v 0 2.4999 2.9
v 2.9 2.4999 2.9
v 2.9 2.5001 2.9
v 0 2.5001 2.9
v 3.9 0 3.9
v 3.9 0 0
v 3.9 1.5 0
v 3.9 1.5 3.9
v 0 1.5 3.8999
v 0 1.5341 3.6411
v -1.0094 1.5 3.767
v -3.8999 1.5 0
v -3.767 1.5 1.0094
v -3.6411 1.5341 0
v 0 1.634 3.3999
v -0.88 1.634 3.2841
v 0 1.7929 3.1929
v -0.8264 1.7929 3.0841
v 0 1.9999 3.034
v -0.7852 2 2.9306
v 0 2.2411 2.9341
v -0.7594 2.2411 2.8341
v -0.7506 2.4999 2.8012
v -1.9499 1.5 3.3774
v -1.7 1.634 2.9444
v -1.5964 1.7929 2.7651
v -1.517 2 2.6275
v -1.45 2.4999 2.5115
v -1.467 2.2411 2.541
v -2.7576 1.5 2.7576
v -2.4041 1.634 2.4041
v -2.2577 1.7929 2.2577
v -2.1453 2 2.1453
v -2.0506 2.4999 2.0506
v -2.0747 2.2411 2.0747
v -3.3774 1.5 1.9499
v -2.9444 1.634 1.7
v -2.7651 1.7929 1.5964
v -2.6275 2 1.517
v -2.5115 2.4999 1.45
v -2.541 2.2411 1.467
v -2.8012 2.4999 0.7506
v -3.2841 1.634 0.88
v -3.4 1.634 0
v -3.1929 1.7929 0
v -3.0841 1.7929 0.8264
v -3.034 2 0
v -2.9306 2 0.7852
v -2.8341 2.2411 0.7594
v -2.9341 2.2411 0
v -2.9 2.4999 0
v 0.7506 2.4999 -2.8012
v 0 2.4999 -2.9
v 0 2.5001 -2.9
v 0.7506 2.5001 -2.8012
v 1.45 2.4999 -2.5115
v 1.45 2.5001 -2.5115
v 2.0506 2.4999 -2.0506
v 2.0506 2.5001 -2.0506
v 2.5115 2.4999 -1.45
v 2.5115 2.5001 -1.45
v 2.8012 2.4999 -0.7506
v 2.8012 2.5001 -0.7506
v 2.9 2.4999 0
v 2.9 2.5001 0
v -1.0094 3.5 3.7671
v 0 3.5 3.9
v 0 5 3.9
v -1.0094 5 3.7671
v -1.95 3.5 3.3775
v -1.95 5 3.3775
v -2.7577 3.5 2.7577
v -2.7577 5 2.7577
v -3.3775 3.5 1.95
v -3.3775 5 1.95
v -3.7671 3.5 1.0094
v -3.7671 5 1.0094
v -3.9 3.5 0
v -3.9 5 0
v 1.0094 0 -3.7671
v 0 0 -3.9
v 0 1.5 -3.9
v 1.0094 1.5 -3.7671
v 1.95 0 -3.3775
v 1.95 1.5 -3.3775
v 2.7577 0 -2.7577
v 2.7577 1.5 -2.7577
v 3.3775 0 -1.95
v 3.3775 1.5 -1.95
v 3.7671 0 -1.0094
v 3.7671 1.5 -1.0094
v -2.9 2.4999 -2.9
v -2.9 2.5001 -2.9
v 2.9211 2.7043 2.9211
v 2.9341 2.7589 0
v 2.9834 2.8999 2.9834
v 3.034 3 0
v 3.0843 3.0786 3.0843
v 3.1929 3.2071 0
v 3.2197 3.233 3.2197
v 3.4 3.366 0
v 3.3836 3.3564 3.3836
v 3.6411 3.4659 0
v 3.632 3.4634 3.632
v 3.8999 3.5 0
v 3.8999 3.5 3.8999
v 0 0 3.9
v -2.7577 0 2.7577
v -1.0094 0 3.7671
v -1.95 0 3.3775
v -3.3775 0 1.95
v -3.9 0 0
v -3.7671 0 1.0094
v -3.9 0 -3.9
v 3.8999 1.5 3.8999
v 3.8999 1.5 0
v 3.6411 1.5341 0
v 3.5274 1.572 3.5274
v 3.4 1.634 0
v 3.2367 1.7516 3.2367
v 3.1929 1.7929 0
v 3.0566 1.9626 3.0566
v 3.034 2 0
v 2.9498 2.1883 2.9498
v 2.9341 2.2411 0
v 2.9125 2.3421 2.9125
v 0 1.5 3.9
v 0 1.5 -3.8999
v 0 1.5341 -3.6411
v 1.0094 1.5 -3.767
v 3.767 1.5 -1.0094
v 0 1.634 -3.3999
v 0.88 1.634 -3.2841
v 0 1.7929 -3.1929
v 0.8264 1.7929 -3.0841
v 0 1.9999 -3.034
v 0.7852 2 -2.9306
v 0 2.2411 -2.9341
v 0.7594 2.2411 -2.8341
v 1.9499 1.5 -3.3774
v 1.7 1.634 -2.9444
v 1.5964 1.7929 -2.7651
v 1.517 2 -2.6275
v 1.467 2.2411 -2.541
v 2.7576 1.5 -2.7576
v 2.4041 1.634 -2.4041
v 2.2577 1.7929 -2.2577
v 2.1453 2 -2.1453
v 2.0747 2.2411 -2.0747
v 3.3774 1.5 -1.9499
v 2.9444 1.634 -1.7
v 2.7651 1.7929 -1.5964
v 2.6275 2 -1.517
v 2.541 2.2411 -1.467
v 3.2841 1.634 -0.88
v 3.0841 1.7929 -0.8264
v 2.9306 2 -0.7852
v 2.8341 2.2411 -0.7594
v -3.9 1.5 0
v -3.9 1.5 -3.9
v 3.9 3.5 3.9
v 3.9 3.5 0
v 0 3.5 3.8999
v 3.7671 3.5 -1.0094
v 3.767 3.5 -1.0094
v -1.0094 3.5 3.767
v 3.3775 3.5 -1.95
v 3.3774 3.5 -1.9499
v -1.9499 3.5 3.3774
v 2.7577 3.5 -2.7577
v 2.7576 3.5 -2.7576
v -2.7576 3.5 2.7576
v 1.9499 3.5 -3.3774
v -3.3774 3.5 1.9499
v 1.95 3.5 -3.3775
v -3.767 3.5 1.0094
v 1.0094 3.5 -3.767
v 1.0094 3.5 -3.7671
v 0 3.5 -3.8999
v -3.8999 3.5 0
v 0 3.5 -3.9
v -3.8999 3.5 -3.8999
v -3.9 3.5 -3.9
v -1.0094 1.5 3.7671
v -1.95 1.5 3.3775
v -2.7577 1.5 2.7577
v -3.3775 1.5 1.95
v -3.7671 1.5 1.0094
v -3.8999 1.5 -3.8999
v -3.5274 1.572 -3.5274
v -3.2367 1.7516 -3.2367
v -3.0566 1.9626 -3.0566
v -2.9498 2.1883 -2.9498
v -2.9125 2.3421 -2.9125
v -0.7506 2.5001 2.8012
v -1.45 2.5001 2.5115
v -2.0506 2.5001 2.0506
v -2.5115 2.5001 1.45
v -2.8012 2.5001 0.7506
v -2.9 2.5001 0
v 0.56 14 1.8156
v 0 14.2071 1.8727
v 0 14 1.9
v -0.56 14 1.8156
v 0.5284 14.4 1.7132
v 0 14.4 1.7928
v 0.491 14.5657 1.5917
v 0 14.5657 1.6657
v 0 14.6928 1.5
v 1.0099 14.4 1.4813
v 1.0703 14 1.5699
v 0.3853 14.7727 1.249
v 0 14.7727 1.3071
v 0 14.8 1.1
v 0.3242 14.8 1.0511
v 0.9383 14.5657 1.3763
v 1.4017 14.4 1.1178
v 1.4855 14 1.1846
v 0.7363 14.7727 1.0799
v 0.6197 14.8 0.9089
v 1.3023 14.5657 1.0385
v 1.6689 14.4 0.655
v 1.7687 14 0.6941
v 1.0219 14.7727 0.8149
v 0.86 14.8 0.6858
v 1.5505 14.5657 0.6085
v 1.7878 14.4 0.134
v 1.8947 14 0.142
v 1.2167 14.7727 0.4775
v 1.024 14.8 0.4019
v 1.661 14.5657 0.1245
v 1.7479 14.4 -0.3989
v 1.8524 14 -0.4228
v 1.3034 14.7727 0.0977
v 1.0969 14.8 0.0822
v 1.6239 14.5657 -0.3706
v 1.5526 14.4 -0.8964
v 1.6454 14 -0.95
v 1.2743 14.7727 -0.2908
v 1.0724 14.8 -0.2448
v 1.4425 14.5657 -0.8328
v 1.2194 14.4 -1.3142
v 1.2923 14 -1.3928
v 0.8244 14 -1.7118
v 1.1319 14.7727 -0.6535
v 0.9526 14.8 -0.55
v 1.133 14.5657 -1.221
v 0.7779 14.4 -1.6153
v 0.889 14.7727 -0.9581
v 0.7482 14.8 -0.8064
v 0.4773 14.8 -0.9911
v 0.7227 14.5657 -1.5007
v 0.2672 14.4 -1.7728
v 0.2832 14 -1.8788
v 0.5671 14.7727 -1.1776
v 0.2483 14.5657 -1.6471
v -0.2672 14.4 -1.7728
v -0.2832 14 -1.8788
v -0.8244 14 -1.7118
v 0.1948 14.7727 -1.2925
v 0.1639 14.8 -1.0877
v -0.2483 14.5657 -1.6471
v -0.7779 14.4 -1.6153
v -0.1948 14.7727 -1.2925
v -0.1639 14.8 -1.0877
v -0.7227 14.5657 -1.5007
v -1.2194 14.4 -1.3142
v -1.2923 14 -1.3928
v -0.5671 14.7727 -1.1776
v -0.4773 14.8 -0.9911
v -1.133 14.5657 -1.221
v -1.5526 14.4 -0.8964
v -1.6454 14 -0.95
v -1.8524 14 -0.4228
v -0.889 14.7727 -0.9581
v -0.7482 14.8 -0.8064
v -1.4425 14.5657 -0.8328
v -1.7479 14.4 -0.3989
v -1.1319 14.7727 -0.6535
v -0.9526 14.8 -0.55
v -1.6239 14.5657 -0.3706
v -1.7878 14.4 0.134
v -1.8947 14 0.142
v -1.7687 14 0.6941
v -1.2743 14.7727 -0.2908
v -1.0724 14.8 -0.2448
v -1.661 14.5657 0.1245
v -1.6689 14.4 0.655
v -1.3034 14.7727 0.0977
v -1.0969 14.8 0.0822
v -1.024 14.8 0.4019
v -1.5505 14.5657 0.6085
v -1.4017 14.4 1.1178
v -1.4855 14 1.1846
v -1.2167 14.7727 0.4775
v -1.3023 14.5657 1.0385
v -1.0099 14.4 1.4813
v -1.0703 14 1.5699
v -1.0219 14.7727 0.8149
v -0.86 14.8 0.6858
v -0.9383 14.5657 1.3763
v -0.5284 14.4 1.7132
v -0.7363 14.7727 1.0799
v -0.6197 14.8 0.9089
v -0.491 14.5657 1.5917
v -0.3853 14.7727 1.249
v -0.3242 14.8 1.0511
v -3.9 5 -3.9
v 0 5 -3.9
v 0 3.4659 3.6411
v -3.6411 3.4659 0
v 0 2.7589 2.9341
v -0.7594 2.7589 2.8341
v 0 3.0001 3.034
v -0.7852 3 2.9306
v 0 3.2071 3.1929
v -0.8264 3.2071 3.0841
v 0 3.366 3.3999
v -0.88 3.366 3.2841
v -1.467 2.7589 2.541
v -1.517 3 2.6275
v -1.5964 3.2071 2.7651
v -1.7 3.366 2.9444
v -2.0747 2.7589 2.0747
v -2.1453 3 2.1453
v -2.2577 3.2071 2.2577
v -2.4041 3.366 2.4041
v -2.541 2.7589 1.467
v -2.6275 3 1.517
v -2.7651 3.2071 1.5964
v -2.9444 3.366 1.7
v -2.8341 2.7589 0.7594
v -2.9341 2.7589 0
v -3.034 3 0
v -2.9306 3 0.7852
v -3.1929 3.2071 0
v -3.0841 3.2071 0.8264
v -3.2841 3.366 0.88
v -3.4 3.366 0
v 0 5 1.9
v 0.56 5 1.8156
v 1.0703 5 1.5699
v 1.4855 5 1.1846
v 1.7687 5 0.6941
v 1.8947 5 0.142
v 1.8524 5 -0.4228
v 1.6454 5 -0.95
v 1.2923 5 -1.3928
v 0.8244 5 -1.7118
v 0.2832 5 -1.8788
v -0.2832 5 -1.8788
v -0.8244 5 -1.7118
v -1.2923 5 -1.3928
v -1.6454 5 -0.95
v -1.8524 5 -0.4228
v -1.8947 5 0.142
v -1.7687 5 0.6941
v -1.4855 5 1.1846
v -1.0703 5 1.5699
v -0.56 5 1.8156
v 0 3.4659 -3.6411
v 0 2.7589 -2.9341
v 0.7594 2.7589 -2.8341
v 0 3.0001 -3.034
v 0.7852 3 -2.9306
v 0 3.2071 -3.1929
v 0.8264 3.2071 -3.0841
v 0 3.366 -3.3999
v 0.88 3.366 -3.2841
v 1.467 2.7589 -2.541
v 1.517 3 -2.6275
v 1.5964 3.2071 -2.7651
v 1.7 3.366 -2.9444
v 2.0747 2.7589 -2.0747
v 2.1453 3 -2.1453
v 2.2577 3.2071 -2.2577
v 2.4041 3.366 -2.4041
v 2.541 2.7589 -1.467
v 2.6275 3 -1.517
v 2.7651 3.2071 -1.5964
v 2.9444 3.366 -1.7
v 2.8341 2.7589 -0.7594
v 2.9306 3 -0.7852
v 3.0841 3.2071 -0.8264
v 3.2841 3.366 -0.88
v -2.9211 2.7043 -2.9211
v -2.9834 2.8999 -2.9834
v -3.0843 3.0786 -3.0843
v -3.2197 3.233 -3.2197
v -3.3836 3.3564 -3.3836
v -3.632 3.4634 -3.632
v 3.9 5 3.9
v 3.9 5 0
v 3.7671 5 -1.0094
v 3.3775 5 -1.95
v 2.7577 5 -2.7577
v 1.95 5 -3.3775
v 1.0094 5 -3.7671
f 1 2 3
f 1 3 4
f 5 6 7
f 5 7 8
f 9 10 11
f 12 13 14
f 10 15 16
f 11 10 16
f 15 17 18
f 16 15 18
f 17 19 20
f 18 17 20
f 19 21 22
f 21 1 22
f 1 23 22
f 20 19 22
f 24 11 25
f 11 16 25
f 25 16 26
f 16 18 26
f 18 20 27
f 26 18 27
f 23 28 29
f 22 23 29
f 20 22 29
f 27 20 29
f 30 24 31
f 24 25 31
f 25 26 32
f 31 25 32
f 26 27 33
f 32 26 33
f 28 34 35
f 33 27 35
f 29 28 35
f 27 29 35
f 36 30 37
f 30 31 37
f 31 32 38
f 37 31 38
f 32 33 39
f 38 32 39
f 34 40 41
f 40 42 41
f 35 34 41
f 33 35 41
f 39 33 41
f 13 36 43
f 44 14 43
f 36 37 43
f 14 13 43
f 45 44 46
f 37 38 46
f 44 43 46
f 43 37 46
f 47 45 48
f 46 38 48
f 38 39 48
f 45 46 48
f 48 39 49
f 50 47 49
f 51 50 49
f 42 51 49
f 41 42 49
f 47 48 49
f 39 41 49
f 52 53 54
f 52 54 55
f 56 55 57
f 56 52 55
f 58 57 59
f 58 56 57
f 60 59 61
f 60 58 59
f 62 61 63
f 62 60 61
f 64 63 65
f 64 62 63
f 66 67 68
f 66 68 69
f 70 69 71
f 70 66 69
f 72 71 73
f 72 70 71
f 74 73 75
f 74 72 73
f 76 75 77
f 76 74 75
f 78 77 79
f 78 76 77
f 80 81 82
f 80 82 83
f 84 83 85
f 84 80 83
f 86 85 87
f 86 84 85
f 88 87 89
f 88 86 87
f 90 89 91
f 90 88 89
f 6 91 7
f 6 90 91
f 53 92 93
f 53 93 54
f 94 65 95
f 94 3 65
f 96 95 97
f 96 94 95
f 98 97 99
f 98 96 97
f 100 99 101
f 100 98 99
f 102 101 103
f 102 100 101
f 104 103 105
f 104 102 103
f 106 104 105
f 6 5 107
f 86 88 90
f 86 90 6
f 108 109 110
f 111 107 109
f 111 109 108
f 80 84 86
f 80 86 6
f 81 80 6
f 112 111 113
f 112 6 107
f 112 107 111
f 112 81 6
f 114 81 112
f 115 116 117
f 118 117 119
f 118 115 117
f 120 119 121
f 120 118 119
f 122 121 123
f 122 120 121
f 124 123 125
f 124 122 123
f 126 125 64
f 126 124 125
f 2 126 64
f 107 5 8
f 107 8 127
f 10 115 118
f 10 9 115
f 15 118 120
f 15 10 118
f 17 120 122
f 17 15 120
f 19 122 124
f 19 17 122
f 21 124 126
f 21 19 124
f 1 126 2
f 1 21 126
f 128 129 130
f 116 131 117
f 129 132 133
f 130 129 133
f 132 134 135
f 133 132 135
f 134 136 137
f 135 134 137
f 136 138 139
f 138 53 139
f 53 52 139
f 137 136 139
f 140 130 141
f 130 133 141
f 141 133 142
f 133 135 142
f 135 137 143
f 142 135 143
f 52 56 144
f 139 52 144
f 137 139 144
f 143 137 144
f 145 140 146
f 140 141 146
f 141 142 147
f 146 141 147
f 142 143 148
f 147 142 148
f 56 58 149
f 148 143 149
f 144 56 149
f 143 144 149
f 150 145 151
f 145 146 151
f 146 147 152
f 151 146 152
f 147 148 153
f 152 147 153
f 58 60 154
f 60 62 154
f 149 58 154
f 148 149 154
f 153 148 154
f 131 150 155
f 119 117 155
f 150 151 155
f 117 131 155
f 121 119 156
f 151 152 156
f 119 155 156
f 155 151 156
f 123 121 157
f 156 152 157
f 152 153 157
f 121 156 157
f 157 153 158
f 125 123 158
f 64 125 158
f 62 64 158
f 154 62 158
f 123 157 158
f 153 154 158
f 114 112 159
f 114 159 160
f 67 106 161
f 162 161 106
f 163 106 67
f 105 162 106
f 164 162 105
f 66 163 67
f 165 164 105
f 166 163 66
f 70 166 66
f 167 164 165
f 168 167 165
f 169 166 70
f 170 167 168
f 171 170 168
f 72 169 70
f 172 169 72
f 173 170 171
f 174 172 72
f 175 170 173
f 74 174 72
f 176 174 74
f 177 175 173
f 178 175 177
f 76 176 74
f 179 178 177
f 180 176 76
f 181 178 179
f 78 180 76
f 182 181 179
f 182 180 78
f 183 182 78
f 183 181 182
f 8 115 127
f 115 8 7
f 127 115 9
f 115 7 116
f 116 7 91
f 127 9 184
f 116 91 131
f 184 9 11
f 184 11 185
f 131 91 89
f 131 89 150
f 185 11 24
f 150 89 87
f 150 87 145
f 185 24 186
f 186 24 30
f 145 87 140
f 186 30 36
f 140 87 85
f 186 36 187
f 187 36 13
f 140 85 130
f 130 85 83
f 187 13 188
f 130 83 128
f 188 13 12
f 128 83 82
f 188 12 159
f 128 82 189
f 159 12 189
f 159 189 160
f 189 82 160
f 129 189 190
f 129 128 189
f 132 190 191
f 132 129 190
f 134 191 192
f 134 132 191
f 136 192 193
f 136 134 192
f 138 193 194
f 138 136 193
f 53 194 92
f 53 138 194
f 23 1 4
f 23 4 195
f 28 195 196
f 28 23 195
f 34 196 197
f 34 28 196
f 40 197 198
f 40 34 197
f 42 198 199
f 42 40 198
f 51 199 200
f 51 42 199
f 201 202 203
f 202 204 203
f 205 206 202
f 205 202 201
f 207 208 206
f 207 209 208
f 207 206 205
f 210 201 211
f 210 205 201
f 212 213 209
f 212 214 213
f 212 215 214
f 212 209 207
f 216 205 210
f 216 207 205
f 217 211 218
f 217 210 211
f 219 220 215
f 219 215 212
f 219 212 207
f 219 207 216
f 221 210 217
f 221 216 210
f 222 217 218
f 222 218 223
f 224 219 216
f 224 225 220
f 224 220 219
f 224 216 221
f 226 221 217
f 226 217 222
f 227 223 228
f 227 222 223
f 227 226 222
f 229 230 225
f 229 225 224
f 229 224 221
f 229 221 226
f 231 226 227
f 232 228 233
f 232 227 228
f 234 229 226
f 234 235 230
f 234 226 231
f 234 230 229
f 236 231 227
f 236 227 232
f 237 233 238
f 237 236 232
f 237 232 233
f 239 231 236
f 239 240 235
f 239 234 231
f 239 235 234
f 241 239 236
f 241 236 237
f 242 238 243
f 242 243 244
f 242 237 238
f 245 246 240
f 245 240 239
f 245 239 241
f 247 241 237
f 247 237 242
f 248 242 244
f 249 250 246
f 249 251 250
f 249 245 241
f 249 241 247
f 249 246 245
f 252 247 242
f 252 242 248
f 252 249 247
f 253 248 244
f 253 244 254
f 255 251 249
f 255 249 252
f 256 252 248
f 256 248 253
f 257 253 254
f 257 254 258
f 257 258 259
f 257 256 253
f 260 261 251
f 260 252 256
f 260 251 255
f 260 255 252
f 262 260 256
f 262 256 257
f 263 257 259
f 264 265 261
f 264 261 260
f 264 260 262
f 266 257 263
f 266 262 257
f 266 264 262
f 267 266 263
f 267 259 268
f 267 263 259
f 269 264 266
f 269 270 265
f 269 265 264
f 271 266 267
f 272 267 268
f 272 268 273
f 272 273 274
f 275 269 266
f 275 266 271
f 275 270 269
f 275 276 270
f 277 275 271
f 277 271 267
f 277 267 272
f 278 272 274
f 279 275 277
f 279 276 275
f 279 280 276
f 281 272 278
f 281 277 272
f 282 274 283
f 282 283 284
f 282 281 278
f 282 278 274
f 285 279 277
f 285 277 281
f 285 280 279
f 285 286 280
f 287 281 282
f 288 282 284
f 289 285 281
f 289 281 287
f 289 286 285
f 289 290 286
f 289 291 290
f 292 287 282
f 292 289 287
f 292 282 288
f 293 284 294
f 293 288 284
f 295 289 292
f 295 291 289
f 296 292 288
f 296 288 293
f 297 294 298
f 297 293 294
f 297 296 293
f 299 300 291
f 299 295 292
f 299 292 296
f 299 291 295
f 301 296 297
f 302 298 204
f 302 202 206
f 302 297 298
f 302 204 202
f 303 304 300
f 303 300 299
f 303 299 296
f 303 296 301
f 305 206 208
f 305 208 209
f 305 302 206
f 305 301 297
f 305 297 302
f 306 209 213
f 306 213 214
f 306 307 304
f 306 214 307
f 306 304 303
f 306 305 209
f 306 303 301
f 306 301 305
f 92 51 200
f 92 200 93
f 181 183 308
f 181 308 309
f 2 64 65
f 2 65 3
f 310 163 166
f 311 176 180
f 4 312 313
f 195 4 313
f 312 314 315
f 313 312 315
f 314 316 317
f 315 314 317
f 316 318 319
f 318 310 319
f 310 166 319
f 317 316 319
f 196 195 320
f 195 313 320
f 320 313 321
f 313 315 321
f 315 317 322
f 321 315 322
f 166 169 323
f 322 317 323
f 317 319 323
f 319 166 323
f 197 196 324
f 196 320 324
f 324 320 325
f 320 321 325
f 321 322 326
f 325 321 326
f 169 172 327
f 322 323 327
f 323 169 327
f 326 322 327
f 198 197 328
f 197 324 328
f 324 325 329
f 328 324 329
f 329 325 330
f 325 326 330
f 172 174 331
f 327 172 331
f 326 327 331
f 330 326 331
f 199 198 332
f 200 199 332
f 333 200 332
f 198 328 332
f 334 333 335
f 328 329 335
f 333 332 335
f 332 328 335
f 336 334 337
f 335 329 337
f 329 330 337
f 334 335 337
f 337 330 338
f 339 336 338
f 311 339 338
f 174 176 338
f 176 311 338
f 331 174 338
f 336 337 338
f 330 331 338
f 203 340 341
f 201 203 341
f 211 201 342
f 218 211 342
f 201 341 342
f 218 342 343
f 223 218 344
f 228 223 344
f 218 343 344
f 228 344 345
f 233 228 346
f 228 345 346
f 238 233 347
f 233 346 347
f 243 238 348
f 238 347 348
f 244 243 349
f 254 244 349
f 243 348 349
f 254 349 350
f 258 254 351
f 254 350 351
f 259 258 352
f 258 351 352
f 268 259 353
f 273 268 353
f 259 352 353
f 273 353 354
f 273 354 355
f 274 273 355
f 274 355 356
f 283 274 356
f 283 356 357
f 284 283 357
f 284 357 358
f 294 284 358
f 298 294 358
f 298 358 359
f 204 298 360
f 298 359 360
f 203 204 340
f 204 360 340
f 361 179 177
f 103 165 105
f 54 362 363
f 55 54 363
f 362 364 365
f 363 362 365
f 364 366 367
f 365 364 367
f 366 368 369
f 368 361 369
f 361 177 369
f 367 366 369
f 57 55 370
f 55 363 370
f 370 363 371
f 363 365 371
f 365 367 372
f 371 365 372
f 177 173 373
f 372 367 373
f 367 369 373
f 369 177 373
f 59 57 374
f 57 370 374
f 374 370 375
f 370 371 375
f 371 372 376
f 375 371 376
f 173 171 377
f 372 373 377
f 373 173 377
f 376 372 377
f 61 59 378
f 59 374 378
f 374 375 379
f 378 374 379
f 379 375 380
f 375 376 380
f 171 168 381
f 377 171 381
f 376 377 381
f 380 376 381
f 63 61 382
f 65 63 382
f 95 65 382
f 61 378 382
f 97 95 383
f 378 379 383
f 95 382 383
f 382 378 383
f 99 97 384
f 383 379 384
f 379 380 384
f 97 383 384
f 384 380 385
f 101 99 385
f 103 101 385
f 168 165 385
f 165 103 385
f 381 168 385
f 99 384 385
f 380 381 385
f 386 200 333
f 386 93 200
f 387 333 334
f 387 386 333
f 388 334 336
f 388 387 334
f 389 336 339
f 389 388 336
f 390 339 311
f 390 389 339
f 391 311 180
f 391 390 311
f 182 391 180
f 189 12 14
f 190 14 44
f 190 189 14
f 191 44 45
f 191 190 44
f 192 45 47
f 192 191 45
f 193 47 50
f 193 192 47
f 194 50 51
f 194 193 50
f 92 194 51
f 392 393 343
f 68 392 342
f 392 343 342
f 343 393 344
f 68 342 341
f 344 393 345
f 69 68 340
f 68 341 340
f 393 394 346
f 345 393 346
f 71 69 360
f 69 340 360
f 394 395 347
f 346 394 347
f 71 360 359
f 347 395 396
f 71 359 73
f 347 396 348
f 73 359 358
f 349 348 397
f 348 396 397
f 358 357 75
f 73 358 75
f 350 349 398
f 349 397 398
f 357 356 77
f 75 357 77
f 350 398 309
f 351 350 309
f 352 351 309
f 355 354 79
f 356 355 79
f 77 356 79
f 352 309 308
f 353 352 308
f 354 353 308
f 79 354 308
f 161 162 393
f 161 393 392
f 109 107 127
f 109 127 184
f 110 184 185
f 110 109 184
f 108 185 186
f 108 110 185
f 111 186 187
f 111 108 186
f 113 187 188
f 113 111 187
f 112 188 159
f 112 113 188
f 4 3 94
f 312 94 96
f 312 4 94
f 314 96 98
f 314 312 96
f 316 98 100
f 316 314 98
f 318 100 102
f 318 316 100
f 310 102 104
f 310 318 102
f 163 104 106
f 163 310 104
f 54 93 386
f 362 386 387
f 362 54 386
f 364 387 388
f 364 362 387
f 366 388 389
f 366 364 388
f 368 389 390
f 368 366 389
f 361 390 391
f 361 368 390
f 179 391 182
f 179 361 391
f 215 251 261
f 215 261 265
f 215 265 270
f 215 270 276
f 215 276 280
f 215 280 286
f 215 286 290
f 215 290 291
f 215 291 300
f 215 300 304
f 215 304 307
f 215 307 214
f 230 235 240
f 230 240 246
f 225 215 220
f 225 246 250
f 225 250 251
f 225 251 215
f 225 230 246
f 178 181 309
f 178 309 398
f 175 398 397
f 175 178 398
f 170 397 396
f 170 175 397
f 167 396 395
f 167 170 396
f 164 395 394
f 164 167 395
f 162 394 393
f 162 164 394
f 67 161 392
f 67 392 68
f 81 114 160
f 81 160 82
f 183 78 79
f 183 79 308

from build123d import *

# Parameters (mm, degrees)
BOSS_EXTRUDE1_DEPTH     = 5
SKETCH2_R               = 1.9
BOSS_EXTRUDE2_DEPTH     = 9.8
CUT_EXTRUDE2_DEPTH      = 1
CUT_EXTRUDE2_DEPTH_BACK = 1
FILLET1_R               = 1
FILLET2_R               = 0.8


with BuildPart() as part:
    # Sketch1 → Boss-Extrude1 (new body)
    with BuildSketch(Plane(origin=(0, 0, 0), x_dir=(1, 0, 0), z_dir=(0, 1, 0))):
        with BuildLine():
            Line((-3.9, 3.9), (0, 3.9))
            ThreePointArc((0, 3.9), (2.757716447, 2.757716447), (3.9, 0))
            Line((3.9, 0), (3.9, -3.9))
            Line((3.9, -3.9), (0, -3.9))
            ThreePointArc((0, -3.9), (-2.757716447, -2.757716447), (-3.9, 0))
            Line((-3.9, 0), (-3.9, 3.9))
        make_face()
    extrude(amount=BOSS_EXTRUDE1_DEPTH)

    # Sketch2 → Boss-Extrude2 (add)
    with BuildSketch(Plane(origin=(0, 5, 0), x_dir=(1, 0, 0), z_dir=(0, 1, 0))):
        with Locations(Location((0, 0, 0), (0, 0, 270))):
            Circle(SKETCH2_R)
    extrude(amount=BOSS_EXTRUDE2_DEPTH)

    # Sketch3 → Cut-Extrude2 (cut, two sides: drawn at the far end of the back side and taken through both)
    with BuildSketch(Plane(origin=(0, 2.5, 0), x_dir=(1, 0, 0), z_dir=(0, 1, 0)).offset(-CUT_EXTRUDE2_DEPTH_BACK)):
        with BuildLine():
            Line((-3.9, 0), (-3.9, 3.9))
            Line((-3.9, 3.9), (0, 3.9))
            ThreePointArc((0, 3.9), (2.757716447, 2.757716447), (3.9, 0))
            Line((3.9, 0), (3.9, -3.9))
            Line((3.9, -3.9), (0, -3.9))
            ThreePointArc((0, -3.9), (-2.757716447, -2.757716447), (-3.9, 0))
        make_face()
        with BuildLine():
            Line((-2.9, 0), (-2.9, 2.9))
            Line((-2.9, 2.9), (0, 2.9))
            ThreePointArc((0, 2.9), (2.050609665, 2.050609665), (2.9, 0))
            Line((2.9, 0), (2.9, -2.9))
            Line((2.9, -2.9), (0, -2.9))
            ThreePointArc((0, -2.9), (-2.050609665, -2.050609665), (-2.9, 0))
        make_face(mode=Mode.SUBTRACT)
    extrude(amount=CUT_EXTRUDE2_DEPTH + CUT_EXTRUDE2_DEPTH_BACK, mode=Mode.SUBTRACT)

    # Fillet1
    fillet1_edges = [part.edges().sort_by_distance(p)[0] for p in [
        (2.9, 3.5, 1.45),
        (2.050609665, 3.5, -2.050609665),
        (1.45, 3.5, 2.9),
        (-2.050609665, 3.5, 2.050609665),
        (2.9, 1.5, 1.45),
        (2.050609665, 1.5, -2.050609665),
        (-2.9, 1.5, -1.45),
        (1.45, 1.5, 2.9),
        (-1.45, 3.5, -2.9),
        (-2.9, 3.5, -1.45),
        (-1.45, 1.5, -2.9),
        (-2.050609665, 1.5, 2.050609665),
    ]]
    fillet(fillet1_edges, radius=FILLET1_R - 0.0001)  # a hair under: the kernel refuses the full size

    # Fillet2
    fillet2_edges = [part.edges().sort_by_distance(p)[0] for p in [
        (0, 14.8, -1.9),
    ]]
    fillet(fillet2_edges, radius=FILLET2_R)


solid = part.part
